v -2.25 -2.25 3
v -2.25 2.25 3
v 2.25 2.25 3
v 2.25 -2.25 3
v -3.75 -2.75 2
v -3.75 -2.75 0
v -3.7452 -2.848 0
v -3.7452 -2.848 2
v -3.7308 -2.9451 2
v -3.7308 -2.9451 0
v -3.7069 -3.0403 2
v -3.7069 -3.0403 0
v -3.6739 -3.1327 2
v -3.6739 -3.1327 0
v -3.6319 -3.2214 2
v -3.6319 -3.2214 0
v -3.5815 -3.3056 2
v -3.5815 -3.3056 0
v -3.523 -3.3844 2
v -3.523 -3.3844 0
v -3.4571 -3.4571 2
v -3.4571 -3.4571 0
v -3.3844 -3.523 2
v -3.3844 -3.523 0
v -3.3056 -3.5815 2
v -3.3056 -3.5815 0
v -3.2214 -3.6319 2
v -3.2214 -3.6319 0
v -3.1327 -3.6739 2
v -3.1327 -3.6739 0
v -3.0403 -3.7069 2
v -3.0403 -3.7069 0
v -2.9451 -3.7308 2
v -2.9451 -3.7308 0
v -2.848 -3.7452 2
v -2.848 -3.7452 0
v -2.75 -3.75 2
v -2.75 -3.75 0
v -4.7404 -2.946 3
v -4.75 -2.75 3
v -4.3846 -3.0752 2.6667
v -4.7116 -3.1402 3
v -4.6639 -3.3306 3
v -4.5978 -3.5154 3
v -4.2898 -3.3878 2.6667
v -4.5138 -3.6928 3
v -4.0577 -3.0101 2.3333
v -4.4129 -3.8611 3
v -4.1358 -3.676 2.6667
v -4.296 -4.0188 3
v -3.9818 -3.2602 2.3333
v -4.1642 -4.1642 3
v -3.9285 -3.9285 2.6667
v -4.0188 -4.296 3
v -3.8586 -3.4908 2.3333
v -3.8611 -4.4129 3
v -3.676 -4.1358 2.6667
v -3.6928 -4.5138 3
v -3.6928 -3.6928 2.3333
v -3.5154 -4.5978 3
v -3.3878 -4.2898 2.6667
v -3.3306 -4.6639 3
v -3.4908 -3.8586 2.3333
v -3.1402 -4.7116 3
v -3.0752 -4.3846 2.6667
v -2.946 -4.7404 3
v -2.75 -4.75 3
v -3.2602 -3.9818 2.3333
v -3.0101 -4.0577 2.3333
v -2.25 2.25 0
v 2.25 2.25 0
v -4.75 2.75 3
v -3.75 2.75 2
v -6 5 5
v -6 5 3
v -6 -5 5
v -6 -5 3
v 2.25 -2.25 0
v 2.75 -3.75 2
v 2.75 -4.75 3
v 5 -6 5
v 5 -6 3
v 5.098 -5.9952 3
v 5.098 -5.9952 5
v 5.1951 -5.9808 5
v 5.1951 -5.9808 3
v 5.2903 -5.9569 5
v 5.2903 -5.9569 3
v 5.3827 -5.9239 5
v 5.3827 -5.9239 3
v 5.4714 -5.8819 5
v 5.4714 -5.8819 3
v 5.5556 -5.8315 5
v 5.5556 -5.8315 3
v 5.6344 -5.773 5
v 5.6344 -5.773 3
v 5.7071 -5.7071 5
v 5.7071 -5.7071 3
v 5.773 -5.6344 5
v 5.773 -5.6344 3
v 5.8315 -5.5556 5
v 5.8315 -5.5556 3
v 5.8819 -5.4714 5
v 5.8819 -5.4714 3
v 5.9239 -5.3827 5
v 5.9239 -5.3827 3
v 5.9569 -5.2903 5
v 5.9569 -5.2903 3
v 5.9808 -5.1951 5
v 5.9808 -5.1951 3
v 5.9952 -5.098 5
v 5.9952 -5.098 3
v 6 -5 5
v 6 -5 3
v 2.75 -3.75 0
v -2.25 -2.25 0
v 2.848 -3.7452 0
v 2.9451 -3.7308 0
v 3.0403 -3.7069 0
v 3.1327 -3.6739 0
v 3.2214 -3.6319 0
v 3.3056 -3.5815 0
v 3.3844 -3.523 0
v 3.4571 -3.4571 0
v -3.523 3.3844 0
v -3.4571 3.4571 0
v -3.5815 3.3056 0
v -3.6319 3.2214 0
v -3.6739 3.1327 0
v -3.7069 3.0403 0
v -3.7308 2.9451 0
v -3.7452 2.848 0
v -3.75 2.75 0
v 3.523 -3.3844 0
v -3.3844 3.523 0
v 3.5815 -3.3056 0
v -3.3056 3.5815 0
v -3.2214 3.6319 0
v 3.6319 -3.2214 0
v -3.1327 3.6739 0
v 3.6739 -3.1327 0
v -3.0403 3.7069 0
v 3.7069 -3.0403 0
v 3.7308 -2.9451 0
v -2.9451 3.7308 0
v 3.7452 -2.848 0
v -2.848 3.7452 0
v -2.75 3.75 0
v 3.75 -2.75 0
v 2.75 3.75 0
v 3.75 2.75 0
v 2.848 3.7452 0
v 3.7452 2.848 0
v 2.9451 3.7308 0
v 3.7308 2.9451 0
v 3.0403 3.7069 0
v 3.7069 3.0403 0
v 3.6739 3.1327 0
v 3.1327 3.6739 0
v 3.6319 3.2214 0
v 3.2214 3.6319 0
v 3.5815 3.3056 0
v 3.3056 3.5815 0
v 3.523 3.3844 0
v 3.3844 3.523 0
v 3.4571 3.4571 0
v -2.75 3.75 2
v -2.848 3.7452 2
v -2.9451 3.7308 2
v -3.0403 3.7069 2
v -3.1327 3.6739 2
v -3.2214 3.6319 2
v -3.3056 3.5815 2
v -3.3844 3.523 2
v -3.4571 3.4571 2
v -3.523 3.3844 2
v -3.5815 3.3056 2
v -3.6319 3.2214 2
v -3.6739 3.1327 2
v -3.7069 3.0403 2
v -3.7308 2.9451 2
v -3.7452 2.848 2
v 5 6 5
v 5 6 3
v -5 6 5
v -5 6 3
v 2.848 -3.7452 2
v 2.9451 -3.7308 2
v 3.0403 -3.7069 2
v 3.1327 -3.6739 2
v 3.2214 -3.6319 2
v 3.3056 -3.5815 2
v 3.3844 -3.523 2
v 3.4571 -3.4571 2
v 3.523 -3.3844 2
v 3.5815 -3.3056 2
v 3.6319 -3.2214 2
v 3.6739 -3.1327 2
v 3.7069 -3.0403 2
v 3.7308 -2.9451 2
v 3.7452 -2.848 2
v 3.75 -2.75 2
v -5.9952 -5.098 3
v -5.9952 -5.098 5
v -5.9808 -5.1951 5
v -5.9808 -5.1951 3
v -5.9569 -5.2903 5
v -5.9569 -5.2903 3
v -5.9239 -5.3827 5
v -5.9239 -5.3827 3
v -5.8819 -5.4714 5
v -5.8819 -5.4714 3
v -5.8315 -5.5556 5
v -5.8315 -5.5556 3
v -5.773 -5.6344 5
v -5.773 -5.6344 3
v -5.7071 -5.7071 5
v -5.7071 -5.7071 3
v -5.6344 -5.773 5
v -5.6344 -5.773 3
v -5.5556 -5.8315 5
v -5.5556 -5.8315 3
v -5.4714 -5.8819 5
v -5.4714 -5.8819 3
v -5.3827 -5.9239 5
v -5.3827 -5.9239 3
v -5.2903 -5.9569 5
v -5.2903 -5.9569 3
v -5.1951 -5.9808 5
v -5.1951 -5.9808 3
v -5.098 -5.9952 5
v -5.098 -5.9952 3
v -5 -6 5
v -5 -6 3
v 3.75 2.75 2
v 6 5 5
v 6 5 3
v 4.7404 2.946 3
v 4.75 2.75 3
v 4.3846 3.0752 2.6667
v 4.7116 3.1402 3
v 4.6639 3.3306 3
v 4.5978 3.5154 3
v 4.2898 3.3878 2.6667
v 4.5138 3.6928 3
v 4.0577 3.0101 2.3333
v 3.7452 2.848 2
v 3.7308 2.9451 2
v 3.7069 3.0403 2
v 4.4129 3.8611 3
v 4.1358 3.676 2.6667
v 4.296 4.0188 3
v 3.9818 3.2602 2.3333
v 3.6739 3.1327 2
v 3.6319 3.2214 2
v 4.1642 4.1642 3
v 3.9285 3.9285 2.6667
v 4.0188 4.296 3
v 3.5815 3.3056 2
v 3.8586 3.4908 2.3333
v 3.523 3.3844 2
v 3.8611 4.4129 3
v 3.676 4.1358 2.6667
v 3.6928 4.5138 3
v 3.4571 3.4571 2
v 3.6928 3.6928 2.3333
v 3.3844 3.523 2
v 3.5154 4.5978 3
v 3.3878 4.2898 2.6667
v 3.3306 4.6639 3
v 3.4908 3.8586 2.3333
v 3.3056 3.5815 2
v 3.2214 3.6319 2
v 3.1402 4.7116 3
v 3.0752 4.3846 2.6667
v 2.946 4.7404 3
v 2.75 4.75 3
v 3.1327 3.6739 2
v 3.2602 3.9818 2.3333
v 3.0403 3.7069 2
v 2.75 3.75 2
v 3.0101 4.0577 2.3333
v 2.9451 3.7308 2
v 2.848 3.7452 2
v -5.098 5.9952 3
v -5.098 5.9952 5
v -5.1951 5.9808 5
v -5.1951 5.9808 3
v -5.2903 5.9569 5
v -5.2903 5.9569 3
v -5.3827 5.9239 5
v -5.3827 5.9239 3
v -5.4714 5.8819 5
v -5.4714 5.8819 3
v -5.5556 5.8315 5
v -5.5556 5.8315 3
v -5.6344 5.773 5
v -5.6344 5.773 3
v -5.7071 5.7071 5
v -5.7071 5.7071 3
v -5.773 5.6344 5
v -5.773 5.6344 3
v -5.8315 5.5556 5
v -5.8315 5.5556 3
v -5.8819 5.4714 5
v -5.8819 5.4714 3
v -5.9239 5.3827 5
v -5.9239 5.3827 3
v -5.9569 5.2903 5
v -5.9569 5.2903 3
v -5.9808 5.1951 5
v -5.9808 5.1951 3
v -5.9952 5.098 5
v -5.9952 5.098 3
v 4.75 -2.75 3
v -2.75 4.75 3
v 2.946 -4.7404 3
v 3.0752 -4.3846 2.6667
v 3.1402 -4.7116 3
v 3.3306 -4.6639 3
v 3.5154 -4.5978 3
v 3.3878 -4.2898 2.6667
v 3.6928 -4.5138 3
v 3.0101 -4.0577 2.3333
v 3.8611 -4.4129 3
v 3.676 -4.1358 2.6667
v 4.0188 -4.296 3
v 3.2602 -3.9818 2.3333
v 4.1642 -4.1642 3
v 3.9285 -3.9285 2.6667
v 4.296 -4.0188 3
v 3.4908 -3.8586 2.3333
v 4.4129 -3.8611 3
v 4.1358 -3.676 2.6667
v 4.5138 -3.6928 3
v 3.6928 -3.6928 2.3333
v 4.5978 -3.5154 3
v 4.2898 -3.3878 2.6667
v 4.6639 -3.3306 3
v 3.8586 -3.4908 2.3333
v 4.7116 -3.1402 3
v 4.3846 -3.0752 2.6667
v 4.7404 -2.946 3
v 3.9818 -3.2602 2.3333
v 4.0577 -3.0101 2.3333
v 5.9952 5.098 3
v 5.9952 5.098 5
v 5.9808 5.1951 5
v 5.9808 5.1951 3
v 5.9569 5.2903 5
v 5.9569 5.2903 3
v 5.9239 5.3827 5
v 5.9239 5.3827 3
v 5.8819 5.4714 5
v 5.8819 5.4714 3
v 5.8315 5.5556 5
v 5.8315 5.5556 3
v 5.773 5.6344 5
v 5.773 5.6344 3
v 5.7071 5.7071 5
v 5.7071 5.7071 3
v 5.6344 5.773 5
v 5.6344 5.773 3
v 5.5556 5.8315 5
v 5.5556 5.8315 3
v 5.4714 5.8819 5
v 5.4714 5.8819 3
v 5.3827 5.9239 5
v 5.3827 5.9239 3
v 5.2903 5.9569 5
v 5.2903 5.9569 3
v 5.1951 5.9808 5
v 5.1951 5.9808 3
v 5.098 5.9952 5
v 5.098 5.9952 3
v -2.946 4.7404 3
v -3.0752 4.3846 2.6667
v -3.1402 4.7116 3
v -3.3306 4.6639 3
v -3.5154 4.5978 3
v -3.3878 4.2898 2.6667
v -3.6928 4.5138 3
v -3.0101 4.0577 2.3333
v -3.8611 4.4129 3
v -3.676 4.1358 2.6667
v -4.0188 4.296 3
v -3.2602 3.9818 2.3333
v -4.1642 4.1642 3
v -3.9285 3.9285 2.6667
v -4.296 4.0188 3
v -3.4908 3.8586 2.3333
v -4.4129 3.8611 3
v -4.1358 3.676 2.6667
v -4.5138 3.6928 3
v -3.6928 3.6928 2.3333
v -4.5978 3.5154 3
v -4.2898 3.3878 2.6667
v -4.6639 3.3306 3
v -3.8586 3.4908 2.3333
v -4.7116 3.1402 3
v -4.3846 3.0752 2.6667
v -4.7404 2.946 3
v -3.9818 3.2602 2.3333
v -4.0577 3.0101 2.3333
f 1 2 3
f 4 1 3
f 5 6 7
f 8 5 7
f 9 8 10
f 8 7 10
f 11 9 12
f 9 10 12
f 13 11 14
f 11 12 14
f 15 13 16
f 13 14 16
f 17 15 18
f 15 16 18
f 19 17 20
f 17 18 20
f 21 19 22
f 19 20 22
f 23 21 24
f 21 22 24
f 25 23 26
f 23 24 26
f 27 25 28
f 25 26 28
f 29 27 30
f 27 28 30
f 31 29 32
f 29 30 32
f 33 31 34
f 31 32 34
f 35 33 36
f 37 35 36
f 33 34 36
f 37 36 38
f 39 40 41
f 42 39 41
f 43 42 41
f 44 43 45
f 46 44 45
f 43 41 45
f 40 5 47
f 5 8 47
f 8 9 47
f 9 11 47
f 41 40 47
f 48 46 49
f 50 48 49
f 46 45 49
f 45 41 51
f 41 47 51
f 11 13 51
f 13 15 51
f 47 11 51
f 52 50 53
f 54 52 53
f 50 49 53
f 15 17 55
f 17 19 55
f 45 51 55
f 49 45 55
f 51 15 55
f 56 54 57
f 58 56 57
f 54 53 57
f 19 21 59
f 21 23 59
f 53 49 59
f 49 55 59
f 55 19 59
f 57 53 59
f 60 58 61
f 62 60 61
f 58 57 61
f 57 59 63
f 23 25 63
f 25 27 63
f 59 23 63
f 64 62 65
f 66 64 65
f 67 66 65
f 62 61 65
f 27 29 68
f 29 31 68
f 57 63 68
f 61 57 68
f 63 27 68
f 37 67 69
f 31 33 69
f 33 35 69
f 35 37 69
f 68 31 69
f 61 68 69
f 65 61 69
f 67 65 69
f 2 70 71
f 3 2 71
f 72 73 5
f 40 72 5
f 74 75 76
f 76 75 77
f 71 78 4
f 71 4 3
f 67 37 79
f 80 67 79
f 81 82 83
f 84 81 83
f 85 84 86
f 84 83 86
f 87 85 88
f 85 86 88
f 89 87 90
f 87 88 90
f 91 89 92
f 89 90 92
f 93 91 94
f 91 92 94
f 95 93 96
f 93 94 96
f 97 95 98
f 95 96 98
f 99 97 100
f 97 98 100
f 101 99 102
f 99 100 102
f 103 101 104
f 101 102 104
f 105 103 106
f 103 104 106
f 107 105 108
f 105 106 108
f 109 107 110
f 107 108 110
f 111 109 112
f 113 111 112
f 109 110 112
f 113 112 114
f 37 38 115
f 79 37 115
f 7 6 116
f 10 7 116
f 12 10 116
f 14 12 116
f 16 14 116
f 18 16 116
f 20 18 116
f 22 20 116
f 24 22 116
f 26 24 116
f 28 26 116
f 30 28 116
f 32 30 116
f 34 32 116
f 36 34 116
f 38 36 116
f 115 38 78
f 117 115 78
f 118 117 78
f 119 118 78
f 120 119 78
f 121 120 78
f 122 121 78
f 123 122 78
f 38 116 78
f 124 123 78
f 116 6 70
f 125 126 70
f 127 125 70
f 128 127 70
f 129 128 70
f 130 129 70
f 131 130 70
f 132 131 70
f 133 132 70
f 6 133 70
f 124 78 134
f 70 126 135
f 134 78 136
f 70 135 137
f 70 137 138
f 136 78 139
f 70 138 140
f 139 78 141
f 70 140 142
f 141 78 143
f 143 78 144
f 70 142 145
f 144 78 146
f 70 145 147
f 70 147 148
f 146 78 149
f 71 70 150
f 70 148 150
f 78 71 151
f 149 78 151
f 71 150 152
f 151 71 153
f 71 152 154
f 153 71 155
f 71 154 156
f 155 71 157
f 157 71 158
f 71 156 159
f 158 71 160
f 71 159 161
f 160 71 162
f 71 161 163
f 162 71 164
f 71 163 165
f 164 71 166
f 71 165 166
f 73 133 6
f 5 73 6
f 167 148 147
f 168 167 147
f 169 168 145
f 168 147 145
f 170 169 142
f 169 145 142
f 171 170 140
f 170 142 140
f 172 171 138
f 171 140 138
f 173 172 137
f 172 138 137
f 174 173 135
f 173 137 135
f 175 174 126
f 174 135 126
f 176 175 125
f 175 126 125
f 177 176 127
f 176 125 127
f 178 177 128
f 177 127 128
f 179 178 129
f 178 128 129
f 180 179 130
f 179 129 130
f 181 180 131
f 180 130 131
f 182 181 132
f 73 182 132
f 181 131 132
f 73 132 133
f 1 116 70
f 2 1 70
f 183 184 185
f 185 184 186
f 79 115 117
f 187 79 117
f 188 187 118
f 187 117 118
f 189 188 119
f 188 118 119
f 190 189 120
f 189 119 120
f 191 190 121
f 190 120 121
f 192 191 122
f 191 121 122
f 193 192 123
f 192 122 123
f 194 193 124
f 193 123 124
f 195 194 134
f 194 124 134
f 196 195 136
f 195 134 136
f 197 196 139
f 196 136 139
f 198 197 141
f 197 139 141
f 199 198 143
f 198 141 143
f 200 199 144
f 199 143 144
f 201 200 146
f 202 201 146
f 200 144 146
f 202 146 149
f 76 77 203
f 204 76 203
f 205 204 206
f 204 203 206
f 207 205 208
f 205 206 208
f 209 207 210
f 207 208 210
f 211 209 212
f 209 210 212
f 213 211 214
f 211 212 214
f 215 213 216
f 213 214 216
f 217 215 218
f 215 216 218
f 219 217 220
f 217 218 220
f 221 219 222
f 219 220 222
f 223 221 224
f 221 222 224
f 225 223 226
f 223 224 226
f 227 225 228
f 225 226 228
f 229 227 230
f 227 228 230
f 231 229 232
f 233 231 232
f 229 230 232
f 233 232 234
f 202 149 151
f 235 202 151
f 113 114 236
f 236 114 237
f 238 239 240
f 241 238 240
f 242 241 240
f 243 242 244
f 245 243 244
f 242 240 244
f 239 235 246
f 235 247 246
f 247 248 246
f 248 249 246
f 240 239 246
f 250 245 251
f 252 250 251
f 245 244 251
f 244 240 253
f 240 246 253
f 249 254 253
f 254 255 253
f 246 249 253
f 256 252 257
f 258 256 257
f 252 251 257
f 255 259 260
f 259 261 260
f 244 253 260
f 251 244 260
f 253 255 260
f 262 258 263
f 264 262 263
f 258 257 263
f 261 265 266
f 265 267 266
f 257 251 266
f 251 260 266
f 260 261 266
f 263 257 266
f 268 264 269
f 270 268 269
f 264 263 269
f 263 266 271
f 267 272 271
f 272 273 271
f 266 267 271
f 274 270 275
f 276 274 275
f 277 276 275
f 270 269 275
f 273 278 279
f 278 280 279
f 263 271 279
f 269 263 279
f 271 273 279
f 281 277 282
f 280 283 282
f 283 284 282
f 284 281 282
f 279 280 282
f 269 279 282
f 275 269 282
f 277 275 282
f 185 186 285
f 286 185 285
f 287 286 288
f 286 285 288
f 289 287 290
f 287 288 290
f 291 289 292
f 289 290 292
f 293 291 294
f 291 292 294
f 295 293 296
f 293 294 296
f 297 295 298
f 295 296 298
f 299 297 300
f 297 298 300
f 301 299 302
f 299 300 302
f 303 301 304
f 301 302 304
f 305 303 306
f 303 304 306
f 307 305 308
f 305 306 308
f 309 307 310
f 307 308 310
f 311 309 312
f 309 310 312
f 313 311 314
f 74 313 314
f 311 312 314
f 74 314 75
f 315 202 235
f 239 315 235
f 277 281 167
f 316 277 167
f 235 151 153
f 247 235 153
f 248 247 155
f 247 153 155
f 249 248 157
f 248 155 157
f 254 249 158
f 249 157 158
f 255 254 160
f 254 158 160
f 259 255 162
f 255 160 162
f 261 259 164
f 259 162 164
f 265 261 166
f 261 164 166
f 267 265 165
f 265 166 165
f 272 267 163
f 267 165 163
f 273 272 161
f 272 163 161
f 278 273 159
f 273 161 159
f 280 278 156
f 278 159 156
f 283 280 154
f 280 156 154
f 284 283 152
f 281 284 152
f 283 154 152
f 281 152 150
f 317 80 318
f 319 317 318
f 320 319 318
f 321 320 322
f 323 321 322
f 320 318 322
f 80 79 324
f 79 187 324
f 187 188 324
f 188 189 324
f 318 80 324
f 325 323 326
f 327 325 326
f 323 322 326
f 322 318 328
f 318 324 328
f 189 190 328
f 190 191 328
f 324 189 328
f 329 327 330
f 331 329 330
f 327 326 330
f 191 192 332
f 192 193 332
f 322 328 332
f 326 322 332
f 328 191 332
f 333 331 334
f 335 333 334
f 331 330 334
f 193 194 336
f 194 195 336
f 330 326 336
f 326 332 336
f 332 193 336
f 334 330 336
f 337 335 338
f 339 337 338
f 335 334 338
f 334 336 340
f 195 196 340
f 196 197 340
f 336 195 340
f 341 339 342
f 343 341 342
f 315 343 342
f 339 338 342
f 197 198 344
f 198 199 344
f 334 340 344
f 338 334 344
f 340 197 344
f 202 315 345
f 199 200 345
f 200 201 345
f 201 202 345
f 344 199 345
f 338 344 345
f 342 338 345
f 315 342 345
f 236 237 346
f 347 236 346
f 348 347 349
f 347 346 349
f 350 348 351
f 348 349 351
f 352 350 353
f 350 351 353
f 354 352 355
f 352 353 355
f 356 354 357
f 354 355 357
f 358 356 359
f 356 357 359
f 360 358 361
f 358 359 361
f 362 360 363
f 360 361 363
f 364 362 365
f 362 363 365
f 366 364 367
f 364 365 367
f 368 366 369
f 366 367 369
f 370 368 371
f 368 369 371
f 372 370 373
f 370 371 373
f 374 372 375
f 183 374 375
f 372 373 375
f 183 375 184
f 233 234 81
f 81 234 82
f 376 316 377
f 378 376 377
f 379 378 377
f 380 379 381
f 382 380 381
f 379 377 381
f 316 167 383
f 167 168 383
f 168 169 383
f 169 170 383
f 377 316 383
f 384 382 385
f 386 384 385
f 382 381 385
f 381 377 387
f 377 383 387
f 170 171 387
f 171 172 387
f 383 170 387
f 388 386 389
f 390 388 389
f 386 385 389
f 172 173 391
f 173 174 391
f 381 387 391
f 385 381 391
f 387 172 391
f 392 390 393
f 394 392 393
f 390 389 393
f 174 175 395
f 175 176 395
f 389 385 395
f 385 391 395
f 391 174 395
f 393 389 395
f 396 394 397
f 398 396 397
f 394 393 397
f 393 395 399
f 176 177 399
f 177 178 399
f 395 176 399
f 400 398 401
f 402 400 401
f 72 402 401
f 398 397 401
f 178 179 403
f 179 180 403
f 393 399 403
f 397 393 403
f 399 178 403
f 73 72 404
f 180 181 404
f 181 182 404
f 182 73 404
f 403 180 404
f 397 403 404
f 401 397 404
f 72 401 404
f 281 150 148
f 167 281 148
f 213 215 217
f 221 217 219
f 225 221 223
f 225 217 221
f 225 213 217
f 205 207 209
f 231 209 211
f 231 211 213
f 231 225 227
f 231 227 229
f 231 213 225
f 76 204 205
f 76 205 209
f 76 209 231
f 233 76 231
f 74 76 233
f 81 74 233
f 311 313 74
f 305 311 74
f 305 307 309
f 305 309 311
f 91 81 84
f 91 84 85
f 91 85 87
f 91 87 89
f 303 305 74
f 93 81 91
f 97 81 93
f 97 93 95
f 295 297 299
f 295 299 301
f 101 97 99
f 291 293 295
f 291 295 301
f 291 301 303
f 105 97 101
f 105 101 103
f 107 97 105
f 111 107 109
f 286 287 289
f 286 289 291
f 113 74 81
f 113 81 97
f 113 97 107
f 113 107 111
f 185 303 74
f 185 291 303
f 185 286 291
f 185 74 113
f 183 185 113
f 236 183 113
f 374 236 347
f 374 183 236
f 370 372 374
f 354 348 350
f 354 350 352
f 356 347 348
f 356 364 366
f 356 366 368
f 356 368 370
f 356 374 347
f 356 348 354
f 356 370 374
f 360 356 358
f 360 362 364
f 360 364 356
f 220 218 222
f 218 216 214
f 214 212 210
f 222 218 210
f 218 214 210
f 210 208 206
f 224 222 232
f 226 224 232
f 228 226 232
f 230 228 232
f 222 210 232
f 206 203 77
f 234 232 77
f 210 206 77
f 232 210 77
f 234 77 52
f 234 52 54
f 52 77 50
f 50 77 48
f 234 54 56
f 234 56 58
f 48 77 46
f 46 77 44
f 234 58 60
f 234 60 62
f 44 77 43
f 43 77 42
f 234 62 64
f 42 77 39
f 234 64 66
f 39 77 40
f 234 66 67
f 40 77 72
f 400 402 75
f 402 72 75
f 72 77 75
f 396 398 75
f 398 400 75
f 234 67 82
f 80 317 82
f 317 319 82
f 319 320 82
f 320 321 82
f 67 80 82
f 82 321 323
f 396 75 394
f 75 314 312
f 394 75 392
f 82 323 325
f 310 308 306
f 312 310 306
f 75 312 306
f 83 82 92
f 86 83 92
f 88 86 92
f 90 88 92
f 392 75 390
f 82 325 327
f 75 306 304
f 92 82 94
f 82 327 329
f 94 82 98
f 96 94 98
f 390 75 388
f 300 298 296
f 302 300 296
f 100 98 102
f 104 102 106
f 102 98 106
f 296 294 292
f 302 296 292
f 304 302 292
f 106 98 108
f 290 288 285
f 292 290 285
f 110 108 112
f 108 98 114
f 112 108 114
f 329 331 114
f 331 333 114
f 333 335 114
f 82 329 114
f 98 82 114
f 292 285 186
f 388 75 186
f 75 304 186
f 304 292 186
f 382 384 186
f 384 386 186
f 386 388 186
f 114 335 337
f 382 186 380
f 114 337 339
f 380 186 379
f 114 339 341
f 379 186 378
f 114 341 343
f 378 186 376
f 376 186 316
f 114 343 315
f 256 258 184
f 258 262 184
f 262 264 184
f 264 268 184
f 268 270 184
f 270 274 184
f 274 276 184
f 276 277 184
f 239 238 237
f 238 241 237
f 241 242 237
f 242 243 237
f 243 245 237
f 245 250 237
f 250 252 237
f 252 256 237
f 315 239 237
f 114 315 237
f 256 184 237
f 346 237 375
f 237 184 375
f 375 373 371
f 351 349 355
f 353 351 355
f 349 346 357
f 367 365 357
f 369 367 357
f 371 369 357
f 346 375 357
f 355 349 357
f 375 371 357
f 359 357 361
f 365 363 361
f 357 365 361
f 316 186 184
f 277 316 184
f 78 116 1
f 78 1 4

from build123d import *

# Parameters (mm, degrees)
F0_W     = 4.5
F0_H     = 4.5
F1_DEPTH = 3
F3_DEPTH = 2
F4_SIZE  = 1


with BuildPart() as f1:
    # F0 (on Top) → F1 (new body)
    with BuildSketch(Plane.XY):
        with BuildLine():
            Line((-2.75, -3.75), (2.75, -3.75))
            ThreePointArc((2.75, -3.75), (3.457107, -3.457107), (3.75, -2.75))
            Line((3.75, -2.75), (3.75, 2.75))
            ThreePointArc((3.75, 2.75), (3.457107, 3.457107), (2.75, 3.75))
            Line((2.75, 3.75), (-2.75, 3.75))
            ThreePointArc((-2.75, 3.75), (-3.457107, 3.457107), (-3.75, 2.75))
            Line((-3.75, 2.75), (-3.75, -2.75))
            ThreePointArc((-3.75, -2.75), (-3.457107, -3.457107), (-2.75, -3.75))
        make_face()
        Rectangle(F0_W, F0_H, mode=Mode.SUBTRACT)
    extrude(amount=F1_DEPTH)

    # F2 (on face) → F3 (join)
    with BuildSketch(Plane.XY.offset(3)):
        with BuildLine():
            ThreePointArc((6, 5), (5.707107, 5.707107), (5, 6))
            Line((5, 6), (-5, 6))
            ThreePointArc((-5, 6), (-5.707107, 5.707107), (-6, 5))
            Line((-6, 5), (-6, -5))
            ThreePointArc((-6, -5), (-5.707107, -5.707107), (-5, -6))
            Line((-5, -6), (5, -6))
            ThreePointArc((5, -6), (5.707107, -5.707107), (6, -5))
            Line((6, -5), (6, 5))
        make_face()
    extrude(amount=F3_DEPTH)

    # F4
    f4_edges = [f1.edges().sort_by_distance(p)[0] for p in [
        (0, -3.75, 3),
    ]]
    chamfer(f4_edges, length=F4_SIZE)


solid = f1.part
